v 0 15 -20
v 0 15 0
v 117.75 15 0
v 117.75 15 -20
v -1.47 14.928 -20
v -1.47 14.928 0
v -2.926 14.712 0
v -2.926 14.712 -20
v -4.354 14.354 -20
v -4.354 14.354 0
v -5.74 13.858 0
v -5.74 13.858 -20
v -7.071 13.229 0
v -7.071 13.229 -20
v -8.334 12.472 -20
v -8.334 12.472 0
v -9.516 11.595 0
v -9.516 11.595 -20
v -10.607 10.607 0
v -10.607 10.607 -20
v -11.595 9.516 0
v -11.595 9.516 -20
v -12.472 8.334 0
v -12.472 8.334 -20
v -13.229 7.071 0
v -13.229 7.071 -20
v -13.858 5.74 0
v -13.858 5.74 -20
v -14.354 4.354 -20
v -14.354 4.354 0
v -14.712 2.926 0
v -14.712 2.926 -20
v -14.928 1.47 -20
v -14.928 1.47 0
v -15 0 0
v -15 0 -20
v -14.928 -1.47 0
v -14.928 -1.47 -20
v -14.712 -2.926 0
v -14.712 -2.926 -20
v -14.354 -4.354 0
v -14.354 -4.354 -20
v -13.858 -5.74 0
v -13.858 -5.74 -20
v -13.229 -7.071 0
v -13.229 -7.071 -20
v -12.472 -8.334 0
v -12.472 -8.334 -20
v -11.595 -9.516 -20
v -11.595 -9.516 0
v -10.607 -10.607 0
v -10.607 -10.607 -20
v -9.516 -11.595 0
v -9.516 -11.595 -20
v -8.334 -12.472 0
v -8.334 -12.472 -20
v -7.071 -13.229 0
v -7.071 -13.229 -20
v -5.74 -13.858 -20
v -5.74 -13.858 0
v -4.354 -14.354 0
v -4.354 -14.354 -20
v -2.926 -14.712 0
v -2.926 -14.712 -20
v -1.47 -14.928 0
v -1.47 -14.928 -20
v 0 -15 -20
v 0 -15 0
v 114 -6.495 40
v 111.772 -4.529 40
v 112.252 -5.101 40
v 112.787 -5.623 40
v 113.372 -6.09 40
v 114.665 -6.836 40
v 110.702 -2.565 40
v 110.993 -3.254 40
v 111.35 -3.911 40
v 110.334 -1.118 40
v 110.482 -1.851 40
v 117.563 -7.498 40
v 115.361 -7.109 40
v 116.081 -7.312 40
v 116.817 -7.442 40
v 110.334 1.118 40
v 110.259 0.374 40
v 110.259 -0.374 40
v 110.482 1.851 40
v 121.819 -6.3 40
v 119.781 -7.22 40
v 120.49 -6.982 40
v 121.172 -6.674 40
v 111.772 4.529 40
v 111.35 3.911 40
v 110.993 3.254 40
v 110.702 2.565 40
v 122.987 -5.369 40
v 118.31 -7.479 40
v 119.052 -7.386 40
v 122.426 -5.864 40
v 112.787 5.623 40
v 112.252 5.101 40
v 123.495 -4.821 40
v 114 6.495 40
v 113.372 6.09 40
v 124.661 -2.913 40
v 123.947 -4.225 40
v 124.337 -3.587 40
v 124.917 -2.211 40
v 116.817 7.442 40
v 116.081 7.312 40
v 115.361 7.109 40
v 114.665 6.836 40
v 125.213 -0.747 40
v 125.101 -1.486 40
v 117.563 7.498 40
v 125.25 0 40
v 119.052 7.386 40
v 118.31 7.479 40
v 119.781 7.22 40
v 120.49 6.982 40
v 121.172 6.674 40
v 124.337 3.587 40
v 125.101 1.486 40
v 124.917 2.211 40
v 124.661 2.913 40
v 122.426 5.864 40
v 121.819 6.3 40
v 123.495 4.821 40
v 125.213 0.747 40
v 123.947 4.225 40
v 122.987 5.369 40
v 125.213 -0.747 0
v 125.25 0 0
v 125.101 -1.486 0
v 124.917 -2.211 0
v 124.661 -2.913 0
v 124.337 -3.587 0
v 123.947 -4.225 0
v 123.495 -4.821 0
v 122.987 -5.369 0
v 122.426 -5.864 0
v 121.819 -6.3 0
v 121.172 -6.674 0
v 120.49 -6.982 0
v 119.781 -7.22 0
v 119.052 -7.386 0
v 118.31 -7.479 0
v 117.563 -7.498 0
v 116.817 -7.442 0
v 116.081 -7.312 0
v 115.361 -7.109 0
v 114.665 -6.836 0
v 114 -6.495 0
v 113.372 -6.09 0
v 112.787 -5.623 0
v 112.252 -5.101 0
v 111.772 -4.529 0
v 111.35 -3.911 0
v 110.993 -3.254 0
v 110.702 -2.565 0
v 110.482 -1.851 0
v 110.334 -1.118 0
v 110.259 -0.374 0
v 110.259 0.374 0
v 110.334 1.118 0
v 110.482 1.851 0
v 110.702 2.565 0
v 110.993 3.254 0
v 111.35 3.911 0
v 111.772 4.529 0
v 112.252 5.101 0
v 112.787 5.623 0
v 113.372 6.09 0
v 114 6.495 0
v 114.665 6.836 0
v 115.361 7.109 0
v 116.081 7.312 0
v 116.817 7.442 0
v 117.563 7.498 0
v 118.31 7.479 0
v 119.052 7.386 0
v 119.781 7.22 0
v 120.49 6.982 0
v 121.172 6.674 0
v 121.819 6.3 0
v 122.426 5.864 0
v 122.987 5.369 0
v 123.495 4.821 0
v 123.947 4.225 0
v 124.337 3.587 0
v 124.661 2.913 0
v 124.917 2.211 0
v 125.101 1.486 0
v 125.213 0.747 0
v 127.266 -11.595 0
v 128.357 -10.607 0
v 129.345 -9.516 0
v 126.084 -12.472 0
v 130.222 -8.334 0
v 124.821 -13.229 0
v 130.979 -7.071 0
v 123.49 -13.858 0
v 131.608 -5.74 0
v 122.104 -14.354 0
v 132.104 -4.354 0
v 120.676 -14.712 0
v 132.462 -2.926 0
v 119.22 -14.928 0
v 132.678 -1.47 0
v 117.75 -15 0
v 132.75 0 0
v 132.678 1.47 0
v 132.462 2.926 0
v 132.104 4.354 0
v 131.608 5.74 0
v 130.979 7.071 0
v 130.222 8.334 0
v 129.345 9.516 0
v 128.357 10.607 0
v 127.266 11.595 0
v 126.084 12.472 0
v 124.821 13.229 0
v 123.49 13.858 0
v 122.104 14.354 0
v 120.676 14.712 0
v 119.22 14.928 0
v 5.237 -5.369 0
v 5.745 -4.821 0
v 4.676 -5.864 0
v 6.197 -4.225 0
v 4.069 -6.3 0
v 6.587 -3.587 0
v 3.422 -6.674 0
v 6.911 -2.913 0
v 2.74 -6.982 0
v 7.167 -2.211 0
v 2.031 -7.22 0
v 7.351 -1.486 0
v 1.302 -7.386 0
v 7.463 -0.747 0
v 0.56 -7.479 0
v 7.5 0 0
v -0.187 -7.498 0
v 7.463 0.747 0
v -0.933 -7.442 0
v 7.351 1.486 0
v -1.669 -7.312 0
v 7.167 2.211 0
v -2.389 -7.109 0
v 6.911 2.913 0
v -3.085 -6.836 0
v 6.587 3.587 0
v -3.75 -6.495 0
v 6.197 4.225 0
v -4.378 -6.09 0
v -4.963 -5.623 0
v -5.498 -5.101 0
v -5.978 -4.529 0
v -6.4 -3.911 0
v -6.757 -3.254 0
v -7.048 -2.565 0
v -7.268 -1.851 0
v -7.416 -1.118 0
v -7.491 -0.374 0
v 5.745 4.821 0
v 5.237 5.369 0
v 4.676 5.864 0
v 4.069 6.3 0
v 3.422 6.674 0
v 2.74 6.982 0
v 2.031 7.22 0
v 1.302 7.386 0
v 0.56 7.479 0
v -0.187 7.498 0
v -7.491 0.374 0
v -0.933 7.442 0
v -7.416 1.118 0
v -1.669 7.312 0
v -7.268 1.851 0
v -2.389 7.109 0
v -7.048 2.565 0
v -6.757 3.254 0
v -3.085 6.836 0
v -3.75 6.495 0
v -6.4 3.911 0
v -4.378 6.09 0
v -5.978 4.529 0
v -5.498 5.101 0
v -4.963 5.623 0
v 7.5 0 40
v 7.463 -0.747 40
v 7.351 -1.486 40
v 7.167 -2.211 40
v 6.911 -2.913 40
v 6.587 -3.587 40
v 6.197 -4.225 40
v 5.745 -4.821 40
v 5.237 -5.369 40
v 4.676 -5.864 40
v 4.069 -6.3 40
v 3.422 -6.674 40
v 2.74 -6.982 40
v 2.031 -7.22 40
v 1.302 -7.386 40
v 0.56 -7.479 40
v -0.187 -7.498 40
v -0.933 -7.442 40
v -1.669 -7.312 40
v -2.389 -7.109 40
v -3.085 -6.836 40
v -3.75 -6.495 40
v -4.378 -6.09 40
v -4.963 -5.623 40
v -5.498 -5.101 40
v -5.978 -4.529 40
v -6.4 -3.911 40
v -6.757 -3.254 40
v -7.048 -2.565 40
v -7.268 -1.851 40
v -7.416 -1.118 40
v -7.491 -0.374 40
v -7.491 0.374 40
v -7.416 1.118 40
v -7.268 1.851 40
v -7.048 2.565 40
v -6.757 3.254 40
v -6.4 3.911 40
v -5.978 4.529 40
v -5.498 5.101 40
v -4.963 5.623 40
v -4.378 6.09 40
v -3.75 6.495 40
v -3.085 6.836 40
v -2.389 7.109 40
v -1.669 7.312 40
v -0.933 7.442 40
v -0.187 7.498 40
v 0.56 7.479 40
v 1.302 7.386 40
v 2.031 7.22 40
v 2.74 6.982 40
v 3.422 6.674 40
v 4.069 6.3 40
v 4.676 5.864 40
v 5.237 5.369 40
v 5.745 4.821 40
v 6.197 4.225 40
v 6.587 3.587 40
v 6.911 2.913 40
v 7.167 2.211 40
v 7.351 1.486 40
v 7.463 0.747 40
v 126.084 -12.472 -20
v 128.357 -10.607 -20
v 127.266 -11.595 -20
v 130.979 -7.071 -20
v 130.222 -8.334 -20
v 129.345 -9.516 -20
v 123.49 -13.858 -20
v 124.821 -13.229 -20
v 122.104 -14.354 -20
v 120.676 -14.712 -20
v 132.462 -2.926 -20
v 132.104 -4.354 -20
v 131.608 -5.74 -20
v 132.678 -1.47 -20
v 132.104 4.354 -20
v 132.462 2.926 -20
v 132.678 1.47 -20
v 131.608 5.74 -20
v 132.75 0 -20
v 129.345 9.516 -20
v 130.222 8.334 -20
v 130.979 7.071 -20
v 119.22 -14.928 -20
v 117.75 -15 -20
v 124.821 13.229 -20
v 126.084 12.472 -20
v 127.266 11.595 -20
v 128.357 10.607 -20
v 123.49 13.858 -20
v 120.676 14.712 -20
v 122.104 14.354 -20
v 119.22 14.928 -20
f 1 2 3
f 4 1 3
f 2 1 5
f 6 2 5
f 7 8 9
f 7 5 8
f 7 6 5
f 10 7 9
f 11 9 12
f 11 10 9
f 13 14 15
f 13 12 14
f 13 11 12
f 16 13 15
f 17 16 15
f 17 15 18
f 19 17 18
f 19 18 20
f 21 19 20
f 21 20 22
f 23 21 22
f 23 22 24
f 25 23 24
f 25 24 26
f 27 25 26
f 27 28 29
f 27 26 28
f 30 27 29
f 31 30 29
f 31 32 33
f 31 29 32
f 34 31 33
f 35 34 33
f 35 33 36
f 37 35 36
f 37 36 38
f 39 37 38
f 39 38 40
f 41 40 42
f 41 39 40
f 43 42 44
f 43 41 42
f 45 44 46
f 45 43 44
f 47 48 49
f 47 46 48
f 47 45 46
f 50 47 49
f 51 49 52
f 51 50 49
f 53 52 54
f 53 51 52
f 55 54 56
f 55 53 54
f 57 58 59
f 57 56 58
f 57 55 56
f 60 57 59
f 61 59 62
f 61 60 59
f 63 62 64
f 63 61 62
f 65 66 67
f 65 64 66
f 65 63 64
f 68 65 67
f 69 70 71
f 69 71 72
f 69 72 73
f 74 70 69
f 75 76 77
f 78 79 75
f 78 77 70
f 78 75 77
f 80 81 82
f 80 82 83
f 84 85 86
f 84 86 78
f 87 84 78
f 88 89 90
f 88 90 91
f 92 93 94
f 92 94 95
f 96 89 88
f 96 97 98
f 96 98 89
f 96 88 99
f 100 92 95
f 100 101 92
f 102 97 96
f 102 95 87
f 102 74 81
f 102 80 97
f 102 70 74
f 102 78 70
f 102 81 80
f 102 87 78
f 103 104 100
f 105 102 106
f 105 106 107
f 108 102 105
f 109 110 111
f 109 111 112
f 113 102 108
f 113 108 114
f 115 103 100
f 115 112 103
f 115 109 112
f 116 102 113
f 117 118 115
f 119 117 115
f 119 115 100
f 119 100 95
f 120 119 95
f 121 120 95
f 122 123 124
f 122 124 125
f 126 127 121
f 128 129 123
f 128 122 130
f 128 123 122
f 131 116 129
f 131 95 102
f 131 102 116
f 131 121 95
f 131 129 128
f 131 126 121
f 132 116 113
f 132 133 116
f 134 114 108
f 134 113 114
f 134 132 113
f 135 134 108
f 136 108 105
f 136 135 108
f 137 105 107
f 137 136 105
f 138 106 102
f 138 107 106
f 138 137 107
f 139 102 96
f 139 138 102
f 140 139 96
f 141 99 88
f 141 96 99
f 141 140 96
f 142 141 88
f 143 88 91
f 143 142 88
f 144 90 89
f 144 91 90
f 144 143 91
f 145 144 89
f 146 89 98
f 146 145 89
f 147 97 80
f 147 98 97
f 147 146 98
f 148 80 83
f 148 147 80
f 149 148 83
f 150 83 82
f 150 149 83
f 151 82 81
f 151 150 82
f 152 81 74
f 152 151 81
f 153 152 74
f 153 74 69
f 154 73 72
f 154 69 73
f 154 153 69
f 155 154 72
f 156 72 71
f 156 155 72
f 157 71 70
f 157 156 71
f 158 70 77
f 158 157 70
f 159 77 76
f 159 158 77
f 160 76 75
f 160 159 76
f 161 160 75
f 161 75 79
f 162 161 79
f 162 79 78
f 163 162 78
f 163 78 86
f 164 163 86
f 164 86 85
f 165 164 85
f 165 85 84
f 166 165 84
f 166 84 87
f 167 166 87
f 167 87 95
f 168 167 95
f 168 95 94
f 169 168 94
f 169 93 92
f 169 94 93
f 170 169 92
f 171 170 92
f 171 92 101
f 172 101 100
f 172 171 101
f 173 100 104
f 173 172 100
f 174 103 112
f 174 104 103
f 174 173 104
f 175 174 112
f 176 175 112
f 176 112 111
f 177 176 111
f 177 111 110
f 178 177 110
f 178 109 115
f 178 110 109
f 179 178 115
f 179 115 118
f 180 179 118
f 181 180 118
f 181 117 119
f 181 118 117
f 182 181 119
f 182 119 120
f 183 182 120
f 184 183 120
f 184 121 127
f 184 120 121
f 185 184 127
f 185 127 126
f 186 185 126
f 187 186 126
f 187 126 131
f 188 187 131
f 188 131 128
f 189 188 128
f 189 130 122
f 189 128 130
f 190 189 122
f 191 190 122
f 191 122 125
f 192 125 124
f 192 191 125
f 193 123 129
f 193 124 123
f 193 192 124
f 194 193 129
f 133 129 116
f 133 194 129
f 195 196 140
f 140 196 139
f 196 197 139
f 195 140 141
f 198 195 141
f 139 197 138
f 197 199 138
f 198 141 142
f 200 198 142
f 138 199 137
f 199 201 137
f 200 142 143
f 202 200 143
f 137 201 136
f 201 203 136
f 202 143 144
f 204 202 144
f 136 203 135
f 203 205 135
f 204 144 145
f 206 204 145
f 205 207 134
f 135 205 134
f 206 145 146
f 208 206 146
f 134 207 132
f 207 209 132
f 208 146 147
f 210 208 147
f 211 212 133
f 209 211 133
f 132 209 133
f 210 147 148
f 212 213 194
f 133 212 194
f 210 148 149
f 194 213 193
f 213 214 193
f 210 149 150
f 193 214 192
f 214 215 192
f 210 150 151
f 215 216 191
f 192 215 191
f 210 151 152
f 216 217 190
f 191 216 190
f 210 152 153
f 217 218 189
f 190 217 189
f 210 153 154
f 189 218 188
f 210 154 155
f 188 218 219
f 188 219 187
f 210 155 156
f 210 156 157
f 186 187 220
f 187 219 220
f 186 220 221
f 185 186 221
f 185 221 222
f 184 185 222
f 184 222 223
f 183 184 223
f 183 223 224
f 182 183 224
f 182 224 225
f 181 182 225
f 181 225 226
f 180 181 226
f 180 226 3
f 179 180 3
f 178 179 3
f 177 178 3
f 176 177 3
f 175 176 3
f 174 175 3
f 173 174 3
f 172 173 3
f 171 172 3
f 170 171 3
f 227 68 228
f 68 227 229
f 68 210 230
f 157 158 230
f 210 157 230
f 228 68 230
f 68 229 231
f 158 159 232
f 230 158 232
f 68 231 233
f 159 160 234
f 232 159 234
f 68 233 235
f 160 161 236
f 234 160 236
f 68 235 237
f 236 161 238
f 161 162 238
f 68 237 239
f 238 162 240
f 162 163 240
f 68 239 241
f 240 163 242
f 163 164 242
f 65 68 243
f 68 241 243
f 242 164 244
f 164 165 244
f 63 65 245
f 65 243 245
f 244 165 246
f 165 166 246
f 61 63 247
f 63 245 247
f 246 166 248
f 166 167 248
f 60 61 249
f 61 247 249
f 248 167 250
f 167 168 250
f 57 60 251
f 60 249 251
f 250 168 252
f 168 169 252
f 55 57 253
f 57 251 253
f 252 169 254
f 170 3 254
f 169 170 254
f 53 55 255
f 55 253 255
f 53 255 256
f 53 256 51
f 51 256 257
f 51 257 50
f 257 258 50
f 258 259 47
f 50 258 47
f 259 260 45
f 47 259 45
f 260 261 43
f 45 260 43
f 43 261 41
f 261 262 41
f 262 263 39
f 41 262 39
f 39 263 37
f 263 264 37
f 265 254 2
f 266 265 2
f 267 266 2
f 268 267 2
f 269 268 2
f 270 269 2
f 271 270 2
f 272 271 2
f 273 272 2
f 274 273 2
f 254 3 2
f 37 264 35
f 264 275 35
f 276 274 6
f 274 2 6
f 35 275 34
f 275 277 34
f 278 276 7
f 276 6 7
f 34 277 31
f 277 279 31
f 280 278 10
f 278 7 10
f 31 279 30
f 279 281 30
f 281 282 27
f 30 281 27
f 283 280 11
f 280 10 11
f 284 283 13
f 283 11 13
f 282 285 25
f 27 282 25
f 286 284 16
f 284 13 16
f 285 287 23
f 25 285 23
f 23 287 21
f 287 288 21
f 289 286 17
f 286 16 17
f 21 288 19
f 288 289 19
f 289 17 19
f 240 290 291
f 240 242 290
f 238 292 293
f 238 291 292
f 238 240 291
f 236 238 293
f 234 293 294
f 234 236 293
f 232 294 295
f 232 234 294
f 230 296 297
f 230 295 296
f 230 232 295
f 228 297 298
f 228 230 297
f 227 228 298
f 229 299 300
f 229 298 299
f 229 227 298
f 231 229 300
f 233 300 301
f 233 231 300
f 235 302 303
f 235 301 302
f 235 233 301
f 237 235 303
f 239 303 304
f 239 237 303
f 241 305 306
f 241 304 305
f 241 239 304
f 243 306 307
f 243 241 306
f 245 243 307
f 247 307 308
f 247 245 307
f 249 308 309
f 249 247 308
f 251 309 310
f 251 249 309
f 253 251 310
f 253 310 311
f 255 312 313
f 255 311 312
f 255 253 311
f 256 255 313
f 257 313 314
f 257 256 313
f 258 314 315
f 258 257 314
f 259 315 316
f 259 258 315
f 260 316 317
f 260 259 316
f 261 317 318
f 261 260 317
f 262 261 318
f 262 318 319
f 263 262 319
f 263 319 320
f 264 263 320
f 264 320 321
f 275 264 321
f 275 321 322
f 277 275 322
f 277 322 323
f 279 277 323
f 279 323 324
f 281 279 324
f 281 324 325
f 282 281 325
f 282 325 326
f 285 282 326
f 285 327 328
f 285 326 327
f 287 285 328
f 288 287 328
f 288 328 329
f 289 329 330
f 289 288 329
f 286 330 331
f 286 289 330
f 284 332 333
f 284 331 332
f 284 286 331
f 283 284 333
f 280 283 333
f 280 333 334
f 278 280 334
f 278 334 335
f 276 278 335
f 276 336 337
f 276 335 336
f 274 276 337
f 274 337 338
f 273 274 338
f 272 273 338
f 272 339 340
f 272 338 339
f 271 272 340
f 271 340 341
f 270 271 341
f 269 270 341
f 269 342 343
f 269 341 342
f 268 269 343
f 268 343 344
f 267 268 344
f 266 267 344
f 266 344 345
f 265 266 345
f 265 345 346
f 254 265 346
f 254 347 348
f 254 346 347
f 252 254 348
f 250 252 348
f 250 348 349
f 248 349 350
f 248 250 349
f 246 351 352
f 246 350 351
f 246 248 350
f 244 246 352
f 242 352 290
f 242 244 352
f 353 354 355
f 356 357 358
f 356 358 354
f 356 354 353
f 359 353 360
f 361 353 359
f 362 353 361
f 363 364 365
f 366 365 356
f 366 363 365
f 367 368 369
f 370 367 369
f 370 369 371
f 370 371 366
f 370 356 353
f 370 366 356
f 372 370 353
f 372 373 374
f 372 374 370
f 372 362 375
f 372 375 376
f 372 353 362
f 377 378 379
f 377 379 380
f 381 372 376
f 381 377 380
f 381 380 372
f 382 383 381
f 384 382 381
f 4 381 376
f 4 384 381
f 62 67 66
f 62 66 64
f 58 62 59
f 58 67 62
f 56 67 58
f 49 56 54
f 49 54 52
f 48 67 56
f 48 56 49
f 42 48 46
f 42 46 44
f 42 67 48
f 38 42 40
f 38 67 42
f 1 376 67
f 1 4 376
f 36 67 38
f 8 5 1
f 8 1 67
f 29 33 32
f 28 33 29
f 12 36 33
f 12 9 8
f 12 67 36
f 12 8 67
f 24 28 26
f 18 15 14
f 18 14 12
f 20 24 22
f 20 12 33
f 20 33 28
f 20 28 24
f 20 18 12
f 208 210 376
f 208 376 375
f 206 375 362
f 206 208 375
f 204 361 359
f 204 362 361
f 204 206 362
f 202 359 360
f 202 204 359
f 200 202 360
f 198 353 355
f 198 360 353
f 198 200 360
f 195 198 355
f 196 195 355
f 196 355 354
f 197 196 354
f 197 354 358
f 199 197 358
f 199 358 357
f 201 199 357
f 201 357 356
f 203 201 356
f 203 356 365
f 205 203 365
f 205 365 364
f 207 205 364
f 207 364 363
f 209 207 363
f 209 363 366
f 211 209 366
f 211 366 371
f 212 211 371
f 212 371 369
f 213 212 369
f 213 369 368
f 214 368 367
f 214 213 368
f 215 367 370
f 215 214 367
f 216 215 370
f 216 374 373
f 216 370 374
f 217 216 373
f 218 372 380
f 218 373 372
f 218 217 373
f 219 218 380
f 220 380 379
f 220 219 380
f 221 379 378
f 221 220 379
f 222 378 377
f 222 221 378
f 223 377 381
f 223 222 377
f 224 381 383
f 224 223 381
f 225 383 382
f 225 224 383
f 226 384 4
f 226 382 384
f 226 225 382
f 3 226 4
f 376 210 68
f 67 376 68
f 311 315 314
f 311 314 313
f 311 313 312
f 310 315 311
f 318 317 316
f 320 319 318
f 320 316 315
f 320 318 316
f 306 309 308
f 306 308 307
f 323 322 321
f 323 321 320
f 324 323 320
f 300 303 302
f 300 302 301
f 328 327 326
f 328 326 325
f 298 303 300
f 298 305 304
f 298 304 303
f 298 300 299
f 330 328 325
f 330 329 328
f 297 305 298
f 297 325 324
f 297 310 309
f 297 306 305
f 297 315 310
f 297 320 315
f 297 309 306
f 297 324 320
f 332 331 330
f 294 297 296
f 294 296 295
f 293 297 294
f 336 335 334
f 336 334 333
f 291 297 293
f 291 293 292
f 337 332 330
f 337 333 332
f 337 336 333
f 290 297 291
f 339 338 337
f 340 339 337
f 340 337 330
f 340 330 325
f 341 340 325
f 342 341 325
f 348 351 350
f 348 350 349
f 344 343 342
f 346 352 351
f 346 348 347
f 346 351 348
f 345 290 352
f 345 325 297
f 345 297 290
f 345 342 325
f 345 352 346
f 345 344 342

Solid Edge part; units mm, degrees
sketch "Sketch1" plane through (0, 0, 0) normal (0, 0, 1) x (1, 0, 0)
  line L0 (0, 15) -> (117.75, 15)
  line L1 (117.75, -15) -> (0, -15)
  arc A0 (117.75, 15) -> (117.75, -15) centre (117.75, 0) cw
  arc A1 (0, -15) -> (0, 15) centre (0, 0) cw
extrude "Protrusion1" add sketch "Sketch1" against normal blind 20
sketch "Sketch2" plane through (103.5, 0, 0) normal (0, 0, 1) x (1, 0, 0)
  circle A0 centre (-103.5, 0) radius 7.5
  circle A1 centre (14.25, 0) radius 7.5
extrude "ExtrudedProtrusion_2" add sketch "Sketch2" along normal blind 40
